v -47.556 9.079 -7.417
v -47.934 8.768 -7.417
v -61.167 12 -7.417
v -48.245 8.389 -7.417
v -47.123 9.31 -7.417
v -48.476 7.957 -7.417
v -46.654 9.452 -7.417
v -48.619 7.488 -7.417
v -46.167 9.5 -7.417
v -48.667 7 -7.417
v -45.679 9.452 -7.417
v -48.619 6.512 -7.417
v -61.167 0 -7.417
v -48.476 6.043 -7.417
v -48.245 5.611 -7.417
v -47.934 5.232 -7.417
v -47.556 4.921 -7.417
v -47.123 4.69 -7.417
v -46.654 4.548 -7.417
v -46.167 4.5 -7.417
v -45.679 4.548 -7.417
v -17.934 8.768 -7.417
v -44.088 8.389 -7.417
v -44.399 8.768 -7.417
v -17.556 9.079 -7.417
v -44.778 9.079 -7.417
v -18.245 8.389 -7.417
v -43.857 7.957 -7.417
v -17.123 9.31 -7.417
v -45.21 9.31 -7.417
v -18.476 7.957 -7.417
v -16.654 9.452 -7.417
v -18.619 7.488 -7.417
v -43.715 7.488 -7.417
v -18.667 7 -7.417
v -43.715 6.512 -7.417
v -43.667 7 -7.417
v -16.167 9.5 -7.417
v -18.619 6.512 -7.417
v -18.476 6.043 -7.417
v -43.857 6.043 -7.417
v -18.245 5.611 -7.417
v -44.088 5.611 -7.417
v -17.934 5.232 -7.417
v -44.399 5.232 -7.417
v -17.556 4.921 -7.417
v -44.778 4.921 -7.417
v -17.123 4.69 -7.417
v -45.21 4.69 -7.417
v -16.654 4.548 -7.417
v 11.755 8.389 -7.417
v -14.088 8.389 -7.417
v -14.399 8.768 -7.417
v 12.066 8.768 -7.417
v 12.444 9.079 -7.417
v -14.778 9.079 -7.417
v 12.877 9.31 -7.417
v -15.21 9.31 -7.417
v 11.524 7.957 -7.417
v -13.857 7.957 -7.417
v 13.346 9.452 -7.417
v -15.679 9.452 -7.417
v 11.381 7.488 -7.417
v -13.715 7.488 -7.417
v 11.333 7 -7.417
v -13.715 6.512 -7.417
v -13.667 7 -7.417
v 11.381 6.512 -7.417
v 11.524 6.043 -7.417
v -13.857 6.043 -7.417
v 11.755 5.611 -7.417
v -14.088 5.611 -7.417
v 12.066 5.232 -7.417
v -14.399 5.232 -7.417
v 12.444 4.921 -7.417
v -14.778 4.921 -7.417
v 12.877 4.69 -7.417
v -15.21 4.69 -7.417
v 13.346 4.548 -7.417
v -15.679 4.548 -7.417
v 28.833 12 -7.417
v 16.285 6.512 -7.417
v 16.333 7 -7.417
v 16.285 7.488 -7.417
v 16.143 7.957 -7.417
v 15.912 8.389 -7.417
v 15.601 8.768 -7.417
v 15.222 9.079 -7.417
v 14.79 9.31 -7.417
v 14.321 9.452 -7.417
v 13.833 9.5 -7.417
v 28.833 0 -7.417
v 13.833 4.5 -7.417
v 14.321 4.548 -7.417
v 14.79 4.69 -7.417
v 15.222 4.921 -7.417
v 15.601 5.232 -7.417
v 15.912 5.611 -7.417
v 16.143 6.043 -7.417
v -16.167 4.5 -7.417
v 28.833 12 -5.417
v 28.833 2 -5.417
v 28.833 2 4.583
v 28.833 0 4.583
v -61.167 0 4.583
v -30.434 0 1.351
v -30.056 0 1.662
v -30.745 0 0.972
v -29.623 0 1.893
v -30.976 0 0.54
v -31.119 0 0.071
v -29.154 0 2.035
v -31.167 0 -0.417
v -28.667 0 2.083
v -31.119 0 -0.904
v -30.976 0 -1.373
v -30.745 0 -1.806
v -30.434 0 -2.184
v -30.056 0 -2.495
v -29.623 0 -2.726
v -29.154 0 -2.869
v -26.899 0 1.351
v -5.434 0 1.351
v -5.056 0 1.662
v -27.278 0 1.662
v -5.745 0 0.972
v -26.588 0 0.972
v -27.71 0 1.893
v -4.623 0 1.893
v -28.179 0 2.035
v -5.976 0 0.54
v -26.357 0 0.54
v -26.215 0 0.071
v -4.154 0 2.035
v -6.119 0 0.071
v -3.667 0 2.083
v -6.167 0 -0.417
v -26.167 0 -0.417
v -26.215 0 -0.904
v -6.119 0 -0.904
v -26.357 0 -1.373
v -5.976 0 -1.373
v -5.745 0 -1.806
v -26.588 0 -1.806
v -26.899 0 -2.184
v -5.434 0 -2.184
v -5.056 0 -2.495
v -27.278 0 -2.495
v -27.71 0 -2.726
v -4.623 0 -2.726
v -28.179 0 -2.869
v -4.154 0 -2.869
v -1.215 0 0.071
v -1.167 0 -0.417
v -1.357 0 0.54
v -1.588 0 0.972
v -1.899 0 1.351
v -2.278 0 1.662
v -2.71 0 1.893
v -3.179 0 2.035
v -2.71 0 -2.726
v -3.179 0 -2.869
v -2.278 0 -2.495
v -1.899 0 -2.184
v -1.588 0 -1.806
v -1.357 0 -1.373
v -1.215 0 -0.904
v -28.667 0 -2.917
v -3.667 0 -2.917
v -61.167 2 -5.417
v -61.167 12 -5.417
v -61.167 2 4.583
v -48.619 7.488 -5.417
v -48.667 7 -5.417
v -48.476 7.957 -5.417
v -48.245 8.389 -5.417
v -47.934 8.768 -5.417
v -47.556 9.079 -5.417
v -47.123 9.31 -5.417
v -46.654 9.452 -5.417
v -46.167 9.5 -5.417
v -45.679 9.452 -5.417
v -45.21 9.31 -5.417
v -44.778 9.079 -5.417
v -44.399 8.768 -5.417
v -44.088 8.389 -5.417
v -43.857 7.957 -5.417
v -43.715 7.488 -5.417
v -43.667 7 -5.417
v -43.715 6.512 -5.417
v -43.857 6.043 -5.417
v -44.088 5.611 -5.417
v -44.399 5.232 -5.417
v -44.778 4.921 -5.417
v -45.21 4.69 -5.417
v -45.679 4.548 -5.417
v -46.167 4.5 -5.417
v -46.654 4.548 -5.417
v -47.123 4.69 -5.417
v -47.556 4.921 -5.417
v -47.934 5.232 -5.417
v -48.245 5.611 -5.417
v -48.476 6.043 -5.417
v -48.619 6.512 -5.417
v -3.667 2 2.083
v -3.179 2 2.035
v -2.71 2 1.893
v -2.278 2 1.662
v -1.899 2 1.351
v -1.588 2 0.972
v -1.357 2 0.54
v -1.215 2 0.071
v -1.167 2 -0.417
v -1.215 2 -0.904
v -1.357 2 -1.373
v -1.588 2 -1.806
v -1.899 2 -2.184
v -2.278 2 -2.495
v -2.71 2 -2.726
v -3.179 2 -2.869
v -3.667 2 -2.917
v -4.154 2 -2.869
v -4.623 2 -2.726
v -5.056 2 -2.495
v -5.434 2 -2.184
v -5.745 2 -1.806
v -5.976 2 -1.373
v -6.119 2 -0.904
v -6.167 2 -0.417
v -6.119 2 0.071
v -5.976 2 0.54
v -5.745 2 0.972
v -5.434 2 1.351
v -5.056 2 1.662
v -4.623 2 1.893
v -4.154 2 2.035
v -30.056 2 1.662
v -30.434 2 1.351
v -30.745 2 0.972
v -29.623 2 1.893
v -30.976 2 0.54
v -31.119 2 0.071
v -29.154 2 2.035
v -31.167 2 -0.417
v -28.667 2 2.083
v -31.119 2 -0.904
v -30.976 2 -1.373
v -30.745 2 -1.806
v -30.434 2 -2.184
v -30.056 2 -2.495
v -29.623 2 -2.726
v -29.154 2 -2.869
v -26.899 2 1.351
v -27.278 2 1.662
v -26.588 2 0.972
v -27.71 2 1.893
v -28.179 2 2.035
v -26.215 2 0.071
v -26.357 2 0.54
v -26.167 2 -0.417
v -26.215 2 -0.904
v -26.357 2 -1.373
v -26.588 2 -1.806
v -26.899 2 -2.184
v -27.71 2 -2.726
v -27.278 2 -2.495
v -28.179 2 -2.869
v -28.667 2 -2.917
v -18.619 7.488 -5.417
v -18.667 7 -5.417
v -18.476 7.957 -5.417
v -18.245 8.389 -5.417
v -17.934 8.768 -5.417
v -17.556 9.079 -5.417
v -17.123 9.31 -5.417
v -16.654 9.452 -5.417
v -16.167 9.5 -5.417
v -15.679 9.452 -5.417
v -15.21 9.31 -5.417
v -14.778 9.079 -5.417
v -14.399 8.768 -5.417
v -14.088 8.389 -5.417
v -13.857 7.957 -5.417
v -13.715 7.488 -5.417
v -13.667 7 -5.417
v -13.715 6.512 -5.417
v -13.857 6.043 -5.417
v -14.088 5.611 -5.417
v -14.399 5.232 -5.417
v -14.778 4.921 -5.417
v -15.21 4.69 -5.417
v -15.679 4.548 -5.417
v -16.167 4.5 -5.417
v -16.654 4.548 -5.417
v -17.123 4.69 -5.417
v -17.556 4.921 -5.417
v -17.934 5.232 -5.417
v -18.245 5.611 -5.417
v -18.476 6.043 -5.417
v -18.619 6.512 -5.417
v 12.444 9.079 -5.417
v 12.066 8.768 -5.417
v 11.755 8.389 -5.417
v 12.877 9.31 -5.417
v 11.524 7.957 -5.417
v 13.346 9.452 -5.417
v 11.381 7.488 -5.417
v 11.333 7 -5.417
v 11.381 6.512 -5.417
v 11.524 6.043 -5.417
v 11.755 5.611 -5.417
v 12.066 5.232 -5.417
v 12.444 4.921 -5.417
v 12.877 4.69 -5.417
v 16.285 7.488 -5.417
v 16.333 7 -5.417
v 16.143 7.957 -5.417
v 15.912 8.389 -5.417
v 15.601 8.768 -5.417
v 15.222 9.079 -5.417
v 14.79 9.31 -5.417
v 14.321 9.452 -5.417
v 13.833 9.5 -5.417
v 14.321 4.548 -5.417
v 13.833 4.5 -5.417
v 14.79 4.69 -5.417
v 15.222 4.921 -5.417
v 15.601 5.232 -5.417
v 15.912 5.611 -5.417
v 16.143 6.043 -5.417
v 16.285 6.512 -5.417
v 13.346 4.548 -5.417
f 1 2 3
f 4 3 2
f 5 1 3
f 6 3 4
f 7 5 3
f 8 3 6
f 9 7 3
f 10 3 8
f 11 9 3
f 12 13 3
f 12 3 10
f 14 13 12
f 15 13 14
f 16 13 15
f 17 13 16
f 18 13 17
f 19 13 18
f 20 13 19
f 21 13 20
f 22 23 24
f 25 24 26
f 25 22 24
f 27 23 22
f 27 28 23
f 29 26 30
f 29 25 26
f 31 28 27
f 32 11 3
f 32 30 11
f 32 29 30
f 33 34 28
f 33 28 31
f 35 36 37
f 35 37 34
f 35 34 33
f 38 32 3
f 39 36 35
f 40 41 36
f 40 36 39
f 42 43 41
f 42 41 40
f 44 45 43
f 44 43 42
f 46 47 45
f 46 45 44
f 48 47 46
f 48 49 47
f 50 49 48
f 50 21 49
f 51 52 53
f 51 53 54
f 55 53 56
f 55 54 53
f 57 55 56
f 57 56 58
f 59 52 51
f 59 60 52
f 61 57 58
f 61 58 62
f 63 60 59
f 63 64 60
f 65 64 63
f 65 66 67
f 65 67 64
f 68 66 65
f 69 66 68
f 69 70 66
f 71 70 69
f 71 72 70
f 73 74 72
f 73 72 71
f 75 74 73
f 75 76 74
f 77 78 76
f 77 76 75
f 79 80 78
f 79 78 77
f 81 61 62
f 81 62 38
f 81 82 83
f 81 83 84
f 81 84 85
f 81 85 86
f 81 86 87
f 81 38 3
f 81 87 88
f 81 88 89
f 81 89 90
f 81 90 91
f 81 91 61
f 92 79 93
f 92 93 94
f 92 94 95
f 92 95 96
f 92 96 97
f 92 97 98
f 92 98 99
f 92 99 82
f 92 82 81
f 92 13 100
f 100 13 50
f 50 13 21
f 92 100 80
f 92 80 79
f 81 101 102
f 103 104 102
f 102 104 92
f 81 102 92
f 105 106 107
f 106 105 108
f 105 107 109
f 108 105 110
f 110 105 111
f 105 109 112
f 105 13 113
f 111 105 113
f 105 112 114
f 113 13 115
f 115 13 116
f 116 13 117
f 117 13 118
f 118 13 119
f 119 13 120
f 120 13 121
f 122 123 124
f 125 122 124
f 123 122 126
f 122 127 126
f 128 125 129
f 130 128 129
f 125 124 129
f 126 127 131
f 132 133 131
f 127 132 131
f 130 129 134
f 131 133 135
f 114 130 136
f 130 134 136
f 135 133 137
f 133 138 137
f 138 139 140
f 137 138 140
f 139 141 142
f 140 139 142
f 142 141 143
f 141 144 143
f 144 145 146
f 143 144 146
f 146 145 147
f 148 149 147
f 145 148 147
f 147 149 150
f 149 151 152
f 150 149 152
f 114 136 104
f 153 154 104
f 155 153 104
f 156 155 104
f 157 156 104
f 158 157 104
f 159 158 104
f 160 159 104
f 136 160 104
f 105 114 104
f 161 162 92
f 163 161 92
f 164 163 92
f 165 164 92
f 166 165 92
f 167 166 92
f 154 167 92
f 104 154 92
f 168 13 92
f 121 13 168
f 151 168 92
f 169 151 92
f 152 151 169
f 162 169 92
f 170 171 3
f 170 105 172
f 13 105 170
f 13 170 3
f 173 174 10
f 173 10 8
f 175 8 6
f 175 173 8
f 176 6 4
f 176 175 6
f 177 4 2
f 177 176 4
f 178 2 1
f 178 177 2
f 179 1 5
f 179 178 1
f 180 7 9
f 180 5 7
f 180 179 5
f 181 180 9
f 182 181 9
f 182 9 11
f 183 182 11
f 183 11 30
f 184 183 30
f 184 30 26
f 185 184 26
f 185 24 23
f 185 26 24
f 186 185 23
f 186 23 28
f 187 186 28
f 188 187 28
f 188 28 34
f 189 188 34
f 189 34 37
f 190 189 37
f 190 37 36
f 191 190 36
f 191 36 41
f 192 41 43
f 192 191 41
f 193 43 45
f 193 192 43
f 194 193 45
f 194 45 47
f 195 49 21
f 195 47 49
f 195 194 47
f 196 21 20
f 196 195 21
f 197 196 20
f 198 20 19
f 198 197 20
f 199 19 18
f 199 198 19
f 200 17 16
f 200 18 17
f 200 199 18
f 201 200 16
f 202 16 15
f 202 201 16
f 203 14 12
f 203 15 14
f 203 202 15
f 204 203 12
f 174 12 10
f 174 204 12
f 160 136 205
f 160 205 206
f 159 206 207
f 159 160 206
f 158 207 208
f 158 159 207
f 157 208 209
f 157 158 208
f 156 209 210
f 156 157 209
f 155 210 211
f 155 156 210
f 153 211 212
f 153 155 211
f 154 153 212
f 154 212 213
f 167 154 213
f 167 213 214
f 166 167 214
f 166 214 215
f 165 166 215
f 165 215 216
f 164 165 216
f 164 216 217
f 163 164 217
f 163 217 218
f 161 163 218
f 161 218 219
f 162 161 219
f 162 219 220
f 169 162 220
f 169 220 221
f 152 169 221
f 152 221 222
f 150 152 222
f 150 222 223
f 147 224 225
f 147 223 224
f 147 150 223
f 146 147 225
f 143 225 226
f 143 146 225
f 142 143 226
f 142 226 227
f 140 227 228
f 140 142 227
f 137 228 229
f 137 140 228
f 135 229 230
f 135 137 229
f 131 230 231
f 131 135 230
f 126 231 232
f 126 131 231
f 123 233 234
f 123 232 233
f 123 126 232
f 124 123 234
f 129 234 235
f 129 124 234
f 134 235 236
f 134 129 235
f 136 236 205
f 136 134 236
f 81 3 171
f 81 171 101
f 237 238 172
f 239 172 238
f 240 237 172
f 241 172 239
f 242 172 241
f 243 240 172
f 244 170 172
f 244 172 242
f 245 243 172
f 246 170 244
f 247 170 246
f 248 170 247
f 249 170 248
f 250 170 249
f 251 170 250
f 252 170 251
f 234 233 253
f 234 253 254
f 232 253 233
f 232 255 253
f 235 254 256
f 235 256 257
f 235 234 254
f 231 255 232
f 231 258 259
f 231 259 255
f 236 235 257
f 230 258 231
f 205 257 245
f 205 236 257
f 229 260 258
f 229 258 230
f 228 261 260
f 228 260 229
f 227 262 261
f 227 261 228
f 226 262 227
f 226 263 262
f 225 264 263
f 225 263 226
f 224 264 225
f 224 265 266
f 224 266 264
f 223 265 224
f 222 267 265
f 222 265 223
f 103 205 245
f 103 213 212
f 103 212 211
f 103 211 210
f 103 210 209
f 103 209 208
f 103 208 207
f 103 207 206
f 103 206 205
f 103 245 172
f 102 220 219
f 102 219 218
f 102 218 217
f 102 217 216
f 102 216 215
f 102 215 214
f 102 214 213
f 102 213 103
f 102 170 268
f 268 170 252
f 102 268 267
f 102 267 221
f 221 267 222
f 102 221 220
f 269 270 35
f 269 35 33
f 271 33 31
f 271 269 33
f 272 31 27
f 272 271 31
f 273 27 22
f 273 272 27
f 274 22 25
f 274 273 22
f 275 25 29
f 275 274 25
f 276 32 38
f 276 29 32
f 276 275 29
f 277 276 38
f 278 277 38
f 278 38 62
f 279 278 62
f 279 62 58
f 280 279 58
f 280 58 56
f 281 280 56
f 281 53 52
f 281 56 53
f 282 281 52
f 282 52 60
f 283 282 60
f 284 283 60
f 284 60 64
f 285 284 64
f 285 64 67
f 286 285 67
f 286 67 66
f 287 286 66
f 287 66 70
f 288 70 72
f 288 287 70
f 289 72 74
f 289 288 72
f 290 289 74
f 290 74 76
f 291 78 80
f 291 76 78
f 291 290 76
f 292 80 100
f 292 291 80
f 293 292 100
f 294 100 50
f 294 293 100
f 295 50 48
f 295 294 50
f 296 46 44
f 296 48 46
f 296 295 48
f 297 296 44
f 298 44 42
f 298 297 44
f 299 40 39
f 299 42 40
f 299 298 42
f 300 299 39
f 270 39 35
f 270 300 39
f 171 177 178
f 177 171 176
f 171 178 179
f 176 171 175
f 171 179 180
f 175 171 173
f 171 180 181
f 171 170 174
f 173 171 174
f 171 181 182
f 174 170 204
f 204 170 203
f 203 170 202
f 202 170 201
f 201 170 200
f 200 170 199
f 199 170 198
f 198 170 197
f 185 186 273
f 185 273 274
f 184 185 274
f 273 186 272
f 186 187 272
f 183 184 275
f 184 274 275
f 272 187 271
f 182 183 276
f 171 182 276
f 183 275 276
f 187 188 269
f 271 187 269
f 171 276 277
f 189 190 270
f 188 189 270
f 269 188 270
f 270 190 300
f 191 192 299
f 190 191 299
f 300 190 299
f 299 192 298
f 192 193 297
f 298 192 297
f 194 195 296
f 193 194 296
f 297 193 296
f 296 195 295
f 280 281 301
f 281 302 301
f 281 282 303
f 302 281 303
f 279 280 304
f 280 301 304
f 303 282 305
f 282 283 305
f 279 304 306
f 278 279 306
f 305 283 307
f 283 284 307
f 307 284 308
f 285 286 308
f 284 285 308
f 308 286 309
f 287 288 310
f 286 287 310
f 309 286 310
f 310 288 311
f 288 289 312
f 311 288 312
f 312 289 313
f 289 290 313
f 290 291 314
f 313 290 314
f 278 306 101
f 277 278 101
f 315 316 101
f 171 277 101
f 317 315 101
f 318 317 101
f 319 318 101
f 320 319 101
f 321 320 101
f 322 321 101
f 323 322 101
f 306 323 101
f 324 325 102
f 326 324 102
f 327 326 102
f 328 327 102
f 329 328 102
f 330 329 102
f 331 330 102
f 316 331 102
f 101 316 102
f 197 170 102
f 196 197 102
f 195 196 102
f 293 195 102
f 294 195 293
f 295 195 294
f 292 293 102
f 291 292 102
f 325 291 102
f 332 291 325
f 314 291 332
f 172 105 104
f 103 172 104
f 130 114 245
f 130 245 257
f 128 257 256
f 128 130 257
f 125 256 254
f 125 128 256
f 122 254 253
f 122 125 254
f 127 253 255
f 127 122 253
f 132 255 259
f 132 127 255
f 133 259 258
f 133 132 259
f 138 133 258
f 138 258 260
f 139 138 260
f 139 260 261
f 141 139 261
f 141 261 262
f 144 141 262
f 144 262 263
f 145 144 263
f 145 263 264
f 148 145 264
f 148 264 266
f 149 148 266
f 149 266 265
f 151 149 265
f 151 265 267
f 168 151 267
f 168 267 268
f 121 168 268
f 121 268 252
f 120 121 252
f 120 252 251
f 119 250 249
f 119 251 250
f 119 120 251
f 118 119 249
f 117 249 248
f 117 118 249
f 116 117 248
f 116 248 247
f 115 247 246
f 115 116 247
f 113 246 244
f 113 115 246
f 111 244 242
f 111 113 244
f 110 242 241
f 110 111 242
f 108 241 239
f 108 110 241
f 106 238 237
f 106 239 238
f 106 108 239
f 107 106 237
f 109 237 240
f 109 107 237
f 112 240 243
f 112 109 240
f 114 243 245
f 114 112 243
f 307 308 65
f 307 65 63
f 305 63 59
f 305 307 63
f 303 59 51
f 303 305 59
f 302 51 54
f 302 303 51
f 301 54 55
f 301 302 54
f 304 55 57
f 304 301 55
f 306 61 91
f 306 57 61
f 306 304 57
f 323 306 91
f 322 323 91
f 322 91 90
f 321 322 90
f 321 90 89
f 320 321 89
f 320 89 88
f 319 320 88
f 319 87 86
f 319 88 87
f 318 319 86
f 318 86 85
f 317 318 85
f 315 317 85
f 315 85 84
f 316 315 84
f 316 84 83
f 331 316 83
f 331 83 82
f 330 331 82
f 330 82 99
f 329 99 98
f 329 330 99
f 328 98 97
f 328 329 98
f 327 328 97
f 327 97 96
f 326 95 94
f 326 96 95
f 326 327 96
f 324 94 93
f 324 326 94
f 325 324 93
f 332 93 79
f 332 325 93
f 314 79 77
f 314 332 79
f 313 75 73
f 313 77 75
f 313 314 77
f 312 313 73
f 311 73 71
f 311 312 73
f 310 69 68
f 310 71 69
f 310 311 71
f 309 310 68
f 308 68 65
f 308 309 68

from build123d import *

# Parameters (mm, degrees)
SKETCH1_W               = 90
SKETCH1_H               = 12
BOSS_EXTRUDE1_DEPTH     = 2
SKETCH2_W               = 90
SKETCH2_H               = 2
BOSS_EXTRUDE2_DEPTH     = 10
CUT_EXTRUDE1_DEPTH      = 63.420894383
CUT_EXTRUDE1_DEPTH_BACK = 63.420894383
SKETCH3_R               = 2.5
CUT_EXTRUDE2_DEPTH      = 64.477248768
CUT_EXTRUDE2_DEPTH_BACK = 64.477248768
SKETCH4_R               = 2.5


with BuildPart() as part:
    # Sketch1 → Boss-Extrude1 (new body)
    with BuildSketch(Plane(origin=(0, 0, 0), x_dir=(1, 0, 0), z_dir=(0, 1, 0))):
        with Locations((-16.166666667, 1.416666667)):
            Rectangle(SKETCH1_W, SKETCH1_H)
    extrude(amount=BOSS_EXTRUDE1_DEPTH)

    # Sketch2 → Boss-Extrude2 (add)
    with BuildSketch(Plane(origin=(0, 2, 0), x_dir=(1, 0, 0), z_dir=(0, 1, 0))):
        with Locations((-16.166666667, 6.416666667)):
            Rectangle(SKETCH2_W, SKETCH2_H)
    extrude(amount=BOSS_EXTRUDE2_DEPTH)

    # Sketch3 → Cut-Extrude1 (cut, two sides: drawn at the far end of the back side and taken through both)
    with BuildSketch(Plane(origin=(0, 2, 0), x_dir=(1, 0, 0), z_dir=(0, 1, 0)).offset(-CUT_EXTRUDE1_DEPTH_BACK)):
        with Locations(Location((-28.666666667, 0.416666667, 0), (0, 0, 270))):
            Circle(SKETCH3_R)
        with Locations(Location((-3.666666667, 0.416666667, 0), (0, 0, 270))):
            Circle(SKETCH3_R)
    extrude(amount=CUT_EXTRUDE1_DEPTH + CUT_EXTRUDE1_DEPTH_BACK, mode=Mode.SUBTRACT)

    # Sketch4 → Cut-Extrude2 (cut, two sides: drawn at the far end of the back side and taken through both)
    with BuildSketch(Plane(origin=(0, 0, -7.416666667), x_dir=(-1, 0, 0), z_dir=(0, 0, -1)).offset(-CUT_EXTRUDE2_DEPTH_BACK)):
        with Locations((-13.833333333, 7)):
            Circle(SKETCH4_R)
        with Locations((16.166666667, 7)):
            Circle(SKETCH4_R)
        with Locations((46.166666667, 7)):
            Circle(SKETCH4_R)
    extrude(amount=CUT_EXTRUDE2_DEPTH + CUT_EXTRUDE2_DEPTH_BACK, mode=Mode.SUBTRACT)


solid = part.part
